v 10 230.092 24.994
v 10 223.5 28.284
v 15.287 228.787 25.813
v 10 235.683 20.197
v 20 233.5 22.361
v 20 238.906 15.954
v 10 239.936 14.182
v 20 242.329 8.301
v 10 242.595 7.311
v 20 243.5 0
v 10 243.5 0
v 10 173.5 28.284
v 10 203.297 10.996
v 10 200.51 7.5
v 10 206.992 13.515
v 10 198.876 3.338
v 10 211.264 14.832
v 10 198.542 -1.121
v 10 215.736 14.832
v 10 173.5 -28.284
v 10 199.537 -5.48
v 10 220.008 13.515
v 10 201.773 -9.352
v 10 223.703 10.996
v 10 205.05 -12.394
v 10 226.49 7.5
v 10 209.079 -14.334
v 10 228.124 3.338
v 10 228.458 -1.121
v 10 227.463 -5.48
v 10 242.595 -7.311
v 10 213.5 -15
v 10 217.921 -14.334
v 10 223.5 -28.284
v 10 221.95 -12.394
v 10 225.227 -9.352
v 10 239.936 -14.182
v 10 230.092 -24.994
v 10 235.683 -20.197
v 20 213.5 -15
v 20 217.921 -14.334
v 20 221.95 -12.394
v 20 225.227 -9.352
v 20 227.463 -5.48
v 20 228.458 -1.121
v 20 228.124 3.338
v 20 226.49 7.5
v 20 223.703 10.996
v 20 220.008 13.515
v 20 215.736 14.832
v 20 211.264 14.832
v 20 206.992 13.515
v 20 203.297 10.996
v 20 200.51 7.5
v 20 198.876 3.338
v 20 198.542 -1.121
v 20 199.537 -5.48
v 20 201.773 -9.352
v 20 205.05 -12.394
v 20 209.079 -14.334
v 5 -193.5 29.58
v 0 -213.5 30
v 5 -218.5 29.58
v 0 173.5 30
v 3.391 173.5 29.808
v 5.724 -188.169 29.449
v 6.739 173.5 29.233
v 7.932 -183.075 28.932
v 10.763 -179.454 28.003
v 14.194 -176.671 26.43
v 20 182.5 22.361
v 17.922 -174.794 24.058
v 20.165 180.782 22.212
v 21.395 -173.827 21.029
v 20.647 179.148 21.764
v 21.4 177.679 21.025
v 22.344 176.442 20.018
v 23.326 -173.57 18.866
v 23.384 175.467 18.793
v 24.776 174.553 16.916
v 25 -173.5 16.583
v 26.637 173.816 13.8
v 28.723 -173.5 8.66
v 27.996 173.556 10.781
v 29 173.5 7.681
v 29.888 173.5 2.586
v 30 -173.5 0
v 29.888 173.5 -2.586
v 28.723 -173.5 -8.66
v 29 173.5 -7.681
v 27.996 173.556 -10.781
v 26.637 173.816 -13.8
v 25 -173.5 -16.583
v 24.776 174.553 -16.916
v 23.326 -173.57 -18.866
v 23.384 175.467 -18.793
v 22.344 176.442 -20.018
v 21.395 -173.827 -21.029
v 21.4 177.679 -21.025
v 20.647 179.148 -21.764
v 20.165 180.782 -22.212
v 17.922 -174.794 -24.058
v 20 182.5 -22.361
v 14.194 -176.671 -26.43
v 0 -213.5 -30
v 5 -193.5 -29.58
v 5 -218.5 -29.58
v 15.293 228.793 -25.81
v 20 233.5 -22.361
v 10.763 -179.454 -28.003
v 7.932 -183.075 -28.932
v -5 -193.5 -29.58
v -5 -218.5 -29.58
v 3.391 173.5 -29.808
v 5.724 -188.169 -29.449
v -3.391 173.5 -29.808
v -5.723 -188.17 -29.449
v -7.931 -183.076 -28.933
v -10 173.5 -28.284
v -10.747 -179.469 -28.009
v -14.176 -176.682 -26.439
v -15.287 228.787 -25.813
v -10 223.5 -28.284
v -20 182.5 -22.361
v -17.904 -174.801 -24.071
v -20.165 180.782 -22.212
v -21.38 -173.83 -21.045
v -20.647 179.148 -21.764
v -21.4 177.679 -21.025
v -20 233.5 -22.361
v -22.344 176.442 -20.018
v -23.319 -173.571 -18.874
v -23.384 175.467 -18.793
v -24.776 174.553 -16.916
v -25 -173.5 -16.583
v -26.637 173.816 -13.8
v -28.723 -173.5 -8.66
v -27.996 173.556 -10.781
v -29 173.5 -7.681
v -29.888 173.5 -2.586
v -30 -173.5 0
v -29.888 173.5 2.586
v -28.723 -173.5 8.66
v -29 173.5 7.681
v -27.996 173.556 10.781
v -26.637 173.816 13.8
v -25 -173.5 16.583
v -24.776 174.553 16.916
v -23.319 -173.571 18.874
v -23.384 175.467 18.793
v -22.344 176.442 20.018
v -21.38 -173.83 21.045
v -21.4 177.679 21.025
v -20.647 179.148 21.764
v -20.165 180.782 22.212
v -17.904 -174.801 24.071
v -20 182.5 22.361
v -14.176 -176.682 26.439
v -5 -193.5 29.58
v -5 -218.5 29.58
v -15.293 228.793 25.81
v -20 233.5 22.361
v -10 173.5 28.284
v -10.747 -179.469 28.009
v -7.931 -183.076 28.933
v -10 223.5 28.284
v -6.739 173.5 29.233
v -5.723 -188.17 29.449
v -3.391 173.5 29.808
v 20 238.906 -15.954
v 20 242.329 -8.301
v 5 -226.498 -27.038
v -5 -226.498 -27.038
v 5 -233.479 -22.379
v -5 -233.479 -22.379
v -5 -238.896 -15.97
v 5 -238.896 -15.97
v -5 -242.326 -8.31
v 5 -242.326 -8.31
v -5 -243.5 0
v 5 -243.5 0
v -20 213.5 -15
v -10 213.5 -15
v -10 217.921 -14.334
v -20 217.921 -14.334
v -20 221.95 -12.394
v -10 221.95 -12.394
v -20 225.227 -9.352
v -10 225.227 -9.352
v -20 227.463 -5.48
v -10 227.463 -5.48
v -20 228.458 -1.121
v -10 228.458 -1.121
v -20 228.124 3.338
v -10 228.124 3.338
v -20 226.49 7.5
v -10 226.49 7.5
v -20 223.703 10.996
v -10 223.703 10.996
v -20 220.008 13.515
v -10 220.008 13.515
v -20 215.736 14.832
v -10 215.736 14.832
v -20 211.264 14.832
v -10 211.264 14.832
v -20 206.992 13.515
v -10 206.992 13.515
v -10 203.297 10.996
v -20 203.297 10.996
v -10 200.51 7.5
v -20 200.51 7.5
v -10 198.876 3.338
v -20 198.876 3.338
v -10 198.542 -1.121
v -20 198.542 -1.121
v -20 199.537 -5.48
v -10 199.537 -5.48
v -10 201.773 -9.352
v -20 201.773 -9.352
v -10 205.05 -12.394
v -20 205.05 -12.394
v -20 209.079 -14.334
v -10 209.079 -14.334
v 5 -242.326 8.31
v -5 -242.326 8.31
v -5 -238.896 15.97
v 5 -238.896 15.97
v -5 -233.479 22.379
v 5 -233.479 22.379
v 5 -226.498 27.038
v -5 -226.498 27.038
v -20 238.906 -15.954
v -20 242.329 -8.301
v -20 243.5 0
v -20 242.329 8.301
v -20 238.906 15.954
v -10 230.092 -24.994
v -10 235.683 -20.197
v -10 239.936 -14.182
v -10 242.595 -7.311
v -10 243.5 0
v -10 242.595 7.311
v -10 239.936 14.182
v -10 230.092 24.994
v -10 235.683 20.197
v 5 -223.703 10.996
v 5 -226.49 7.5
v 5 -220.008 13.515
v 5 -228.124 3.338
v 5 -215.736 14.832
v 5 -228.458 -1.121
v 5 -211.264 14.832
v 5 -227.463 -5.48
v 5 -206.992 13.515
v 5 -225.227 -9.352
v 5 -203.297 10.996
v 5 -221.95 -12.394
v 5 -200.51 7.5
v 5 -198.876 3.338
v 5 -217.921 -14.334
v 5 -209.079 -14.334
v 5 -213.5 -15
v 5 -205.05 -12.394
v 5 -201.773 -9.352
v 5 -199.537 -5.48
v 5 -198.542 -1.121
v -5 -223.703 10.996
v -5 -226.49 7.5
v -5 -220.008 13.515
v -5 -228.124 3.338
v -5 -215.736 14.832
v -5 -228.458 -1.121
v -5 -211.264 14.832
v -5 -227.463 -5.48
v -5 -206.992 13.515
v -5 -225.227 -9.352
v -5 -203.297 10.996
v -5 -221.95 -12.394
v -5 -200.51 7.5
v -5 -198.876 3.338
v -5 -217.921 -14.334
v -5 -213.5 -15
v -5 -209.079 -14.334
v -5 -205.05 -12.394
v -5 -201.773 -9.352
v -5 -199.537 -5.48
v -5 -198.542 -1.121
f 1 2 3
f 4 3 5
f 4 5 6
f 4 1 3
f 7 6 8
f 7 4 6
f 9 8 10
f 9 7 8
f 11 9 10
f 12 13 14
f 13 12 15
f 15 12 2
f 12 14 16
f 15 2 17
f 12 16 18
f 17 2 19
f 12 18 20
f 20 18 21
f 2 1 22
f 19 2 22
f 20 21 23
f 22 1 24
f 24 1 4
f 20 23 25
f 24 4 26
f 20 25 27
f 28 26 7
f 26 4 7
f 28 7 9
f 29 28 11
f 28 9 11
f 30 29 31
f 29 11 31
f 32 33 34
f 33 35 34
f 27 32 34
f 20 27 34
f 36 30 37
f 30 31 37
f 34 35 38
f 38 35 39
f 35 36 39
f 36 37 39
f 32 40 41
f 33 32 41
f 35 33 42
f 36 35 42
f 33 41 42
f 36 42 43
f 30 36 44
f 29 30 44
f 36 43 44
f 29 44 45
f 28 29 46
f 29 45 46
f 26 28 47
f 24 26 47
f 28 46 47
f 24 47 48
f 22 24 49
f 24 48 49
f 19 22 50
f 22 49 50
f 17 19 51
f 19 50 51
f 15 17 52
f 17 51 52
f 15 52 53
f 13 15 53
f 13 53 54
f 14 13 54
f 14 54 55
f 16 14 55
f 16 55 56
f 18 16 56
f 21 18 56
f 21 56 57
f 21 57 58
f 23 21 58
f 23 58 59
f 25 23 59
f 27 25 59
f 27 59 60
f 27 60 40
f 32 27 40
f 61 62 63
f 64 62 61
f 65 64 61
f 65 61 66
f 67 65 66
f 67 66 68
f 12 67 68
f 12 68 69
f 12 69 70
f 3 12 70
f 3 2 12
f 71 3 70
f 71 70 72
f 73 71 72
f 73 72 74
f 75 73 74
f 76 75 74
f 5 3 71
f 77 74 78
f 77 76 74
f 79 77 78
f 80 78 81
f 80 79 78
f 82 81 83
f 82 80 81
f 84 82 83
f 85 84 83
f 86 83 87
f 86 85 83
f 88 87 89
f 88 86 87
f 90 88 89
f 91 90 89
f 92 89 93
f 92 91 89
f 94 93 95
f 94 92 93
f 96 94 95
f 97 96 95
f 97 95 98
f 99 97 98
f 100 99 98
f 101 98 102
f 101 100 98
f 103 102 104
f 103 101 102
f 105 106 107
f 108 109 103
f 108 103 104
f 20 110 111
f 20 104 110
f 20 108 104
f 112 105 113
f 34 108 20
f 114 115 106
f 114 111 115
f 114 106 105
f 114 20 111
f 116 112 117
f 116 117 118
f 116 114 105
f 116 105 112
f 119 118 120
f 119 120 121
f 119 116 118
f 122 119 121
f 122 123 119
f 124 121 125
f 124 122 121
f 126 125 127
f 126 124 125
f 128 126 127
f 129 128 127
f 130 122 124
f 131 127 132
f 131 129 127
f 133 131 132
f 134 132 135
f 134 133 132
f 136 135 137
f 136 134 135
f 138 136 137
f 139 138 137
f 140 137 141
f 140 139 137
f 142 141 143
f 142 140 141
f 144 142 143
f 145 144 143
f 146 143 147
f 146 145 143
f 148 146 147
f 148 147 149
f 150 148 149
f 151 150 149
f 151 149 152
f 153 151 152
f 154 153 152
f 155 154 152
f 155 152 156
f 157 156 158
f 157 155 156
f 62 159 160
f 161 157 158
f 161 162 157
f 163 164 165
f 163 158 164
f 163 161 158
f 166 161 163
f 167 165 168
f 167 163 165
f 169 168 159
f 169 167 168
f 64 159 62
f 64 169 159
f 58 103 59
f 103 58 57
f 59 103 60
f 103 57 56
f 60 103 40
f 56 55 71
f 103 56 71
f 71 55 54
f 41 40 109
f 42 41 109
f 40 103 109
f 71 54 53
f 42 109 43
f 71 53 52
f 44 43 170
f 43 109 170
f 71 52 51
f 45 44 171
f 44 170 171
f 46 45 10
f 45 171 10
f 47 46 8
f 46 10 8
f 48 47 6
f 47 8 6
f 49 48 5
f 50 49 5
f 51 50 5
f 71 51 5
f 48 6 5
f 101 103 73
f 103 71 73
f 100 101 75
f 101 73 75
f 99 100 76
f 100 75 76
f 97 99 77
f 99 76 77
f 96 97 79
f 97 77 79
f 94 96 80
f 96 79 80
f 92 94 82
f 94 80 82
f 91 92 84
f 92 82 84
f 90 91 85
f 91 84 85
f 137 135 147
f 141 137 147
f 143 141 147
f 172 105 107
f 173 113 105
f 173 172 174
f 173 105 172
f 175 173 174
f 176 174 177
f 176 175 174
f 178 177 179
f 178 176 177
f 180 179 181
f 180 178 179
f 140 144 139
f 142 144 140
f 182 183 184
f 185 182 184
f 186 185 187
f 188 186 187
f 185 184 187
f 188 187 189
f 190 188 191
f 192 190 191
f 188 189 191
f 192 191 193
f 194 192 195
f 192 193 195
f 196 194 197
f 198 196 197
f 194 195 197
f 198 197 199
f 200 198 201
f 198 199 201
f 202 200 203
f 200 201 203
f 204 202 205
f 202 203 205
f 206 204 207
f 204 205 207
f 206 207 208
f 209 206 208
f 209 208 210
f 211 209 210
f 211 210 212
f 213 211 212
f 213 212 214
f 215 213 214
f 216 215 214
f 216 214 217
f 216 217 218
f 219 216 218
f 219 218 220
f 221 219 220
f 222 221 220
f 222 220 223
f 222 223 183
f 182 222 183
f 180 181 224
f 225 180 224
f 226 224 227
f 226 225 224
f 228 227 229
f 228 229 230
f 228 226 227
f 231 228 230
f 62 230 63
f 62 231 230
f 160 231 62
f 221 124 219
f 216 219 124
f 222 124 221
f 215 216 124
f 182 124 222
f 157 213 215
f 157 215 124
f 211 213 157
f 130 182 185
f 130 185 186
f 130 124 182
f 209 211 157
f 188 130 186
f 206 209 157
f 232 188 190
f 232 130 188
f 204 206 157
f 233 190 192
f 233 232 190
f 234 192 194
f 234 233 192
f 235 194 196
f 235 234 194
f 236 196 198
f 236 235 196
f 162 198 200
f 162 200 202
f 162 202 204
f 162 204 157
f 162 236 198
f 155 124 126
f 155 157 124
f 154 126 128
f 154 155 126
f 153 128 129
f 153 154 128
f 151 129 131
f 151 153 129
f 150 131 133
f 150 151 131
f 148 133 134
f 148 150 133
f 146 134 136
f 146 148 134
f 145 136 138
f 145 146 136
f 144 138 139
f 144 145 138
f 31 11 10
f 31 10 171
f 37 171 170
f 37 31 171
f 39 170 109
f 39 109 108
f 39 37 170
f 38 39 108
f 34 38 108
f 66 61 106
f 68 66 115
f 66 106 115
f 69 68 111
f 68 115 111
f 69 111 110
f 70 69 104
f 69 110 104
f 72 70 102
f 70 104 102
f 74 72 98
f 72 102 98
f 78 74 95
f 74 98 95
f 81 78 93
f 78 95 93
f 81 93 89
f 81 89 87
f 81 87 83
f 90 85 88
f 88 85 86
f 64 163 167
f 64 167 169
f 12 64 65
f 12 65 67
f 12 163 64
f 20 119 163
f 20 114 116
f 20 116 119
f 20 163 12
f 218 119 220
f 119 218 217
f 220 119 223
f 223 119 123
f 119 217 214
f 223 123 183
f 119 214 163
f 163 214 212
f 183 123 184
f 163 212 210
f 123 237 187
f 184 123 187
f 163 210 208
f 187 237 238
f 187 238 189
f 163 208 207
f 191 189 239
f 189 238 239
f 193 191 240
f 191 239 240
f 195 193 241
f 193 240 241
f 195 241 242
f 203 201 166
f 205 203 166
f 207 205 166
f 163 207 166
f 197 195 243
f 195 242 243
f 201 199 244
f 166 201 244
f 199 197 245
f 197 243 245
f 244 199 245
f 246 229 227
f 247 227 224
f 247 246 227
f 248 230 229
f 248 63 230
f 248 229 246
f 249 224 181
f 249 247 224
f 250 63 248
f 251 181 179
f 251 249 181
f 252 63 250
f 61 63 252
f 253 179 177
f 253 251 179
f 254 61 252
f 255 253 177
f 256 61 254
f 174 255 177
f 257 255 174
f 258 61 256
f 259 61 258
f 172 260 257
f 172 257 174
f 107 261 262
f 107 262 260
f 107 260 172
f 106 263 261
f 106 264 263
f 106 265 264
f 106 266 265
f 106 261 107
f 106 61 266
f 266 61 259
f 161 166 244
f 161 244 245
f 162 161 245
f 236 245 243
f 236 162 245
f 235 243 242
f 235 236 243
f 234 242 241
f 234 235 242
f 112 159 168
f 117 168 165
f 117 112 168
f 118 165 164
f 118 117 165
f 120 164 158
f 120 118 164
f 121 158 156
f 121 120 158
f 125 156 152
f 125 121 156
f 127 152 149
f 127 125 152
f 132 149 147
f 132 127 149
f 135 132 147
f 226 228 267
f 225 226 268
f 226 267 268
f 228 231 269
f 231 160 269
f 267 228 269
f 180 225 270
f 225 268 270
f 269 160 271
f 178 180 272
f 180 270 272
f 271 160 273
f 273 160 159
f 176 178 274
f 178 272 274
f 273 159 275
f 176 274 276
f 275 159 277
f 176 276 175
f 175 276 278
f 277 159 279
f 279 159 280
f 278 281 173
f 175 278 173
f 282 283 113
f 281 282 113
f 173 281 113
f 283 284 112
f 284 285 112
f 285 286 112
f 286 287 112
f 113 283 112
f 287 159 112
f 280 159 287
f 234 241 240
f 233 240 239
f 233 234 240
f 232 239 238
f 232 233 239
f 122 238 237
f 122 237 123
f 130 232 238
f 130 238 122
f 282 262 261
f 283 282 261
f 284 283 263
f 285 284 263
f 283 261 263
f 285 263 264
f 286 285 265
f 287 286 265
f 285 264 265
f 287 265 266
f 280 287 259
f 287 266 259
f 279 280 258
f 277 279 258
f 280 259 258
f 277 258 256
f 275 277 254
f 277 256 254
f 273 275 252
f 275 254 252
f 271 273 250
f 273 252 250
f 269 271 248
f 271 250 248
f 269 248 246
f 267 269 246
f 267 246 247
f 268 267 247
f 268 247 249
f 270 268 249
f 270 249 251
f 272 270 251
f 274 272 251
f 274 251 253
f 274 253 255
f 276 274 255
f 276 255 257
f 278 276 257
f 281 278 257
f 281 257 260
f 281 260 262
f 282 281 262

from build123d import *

# Parameters (mm, degrees)
SKETCH1_R               = 30
BOSS_EXTRUDE1_DEPTH     = 243.5
CUT_EXTRUDE1_DEPTH      = 70
FILLET1_R               = 9
FILLET2_R               = 9
SKETCH4_R               = 15
CUT_EXTRUDE2_DEPTH      = 70
CUT_EXTRUDE3_DEPTH      = 70
CUT_EXTRUDE3_DEPTH_BACK = 70
CUT_EXTRUDE4_START      = -70
CUT_EXTRUDE4_DEPTH      = 70
SKETCH8_R               = 15
CUT_EXTRUDE5_DEPTH      = 60
CUT_EXTRUDE8_DEPTH      = 60
CUT_EXTRUDE8_DEPTH_BACK = 60
FILLET3_R               = 20
FILLET4_R               = 20


with BuildPart() as part:
    # Sketch1 → Boss-Extrude1 (new, symmetric)
    with BuildSketch(Plane(origin=(0, 0, 0), x_dir=(1, 0, 0), z_dir=(0, 1, 0))):
        with Locations(Location((0, 0, 0), (0, 0, 270))):
            Circle(SKETCH1_R)
    extrude(amount=BOSS_EXTRUDE1_DEPTH, both=True)

    # Sketch3 → Cut-Extrude1 (cut)
    with BuildSketch(Plane(origin=(0, 243.5, 0), x_dir=(1, 0, 0), z_dir=(0, 1, 0))):
        with BuildLine():
            Line((-10, 28.284271247), (-10, -28.284271247))
            ThreePointArc((-10, -28.284271247), (0, -30), (10, -28.284271247))
            Line((10, -28.284271247), (10, 28.284271247))
            ThreePointArc((10, 28.284271247), (0, 30), (-10, 28.284271247))
        make_face()
        with BuildLine():
            Line((-20, 22.360679775), (-20, -22.360679775))
            ThreePointArc((-20, -22.360679775), (-30, 0), (-20, 22.360679775))
        make_face()
        with BuildLine():
            Line((20, 22.360679775), (20, -22.360679775))
            ThreePointArc((20, -22.360679775), (30, 0), (20, 22.360679775))
        make_face()
    extrude(amount=-CUT_EXTRUDE1_DEPTH, mode=Mode.SUBTRACT)

    # Fillet1
    fillet1_edges = [part.edges().sort_by_distance(p)[0] for p in [
        (-20, 173.5, 0),
    ]]
    fillet(fillet1_edges, radius=FILLET1_R)

    # Fillet2
    fillet2_edges = [part.edges().sort_by_distance(p)[0] for p in [
        (20, 173.5, 0),
    ]]
    fillet(fillet2_edges, radius=FILLET2_R)

    # Sketch4 → Cut-Extrude2 (cut)
    with BuildSketch(Plane(origin=(20, 0, 0), x_dir=(0, 0, -1), z_dir=(1, 0, 0))):
        with Locations((0, 213.5)):
            Circle(SKETCH4_R)
    extrude(amount=-CUT_EXTRUDE2_DEPTH, mode=Mode.SUBTRACT)

    # Sketch6 → Cut-Extrude3 (cut, two sides: drawn at the far end of the back side and taken through both)
    with BuildSketch(Plane(origin=(0, 0, 0), x_dir=(0, 0, -1), z_dir=(1, 0, 0)).offset(-CUT_EXTRUDE3_DEPTH_BACK)):
        with BuildLine():
            Line((-1.96e-07, 243.5), (-28.284271247, 243.5))
            Line((-28.284271247, 243.5), (-28.284271247, 223.5))
            ThreePointArc((-28.284271247, 223.5), (-17.320508156, 237.994897371), (-1.96e-07, 243.5))
        make_face()
        with BuildLine():
            Line((28.284271247, 243.5), (-1.96e-07, 243.5))
            ThreePointArc((-1.96e-07, 243.5), (17.320507996, 237.994897484), (28.284271247, 223.5))
            Line((28.284271247, 223.5), (28.284271247, 243.5))
        make_face()
    extrude(amount=CUT_EXTRUDE3_DEPTH + CUT_EXTRUDE3_DEPTH_BACK, mode=Mode.SUBTRACT)

    # Sketch7 → Cut-Extrude4 (cut)
    with BuildSketch(Plane.XZ.offset(243.5).offset(CUT_EXTRUDE4_START)):
        with BuildLine():
            Line((-5, 29.580398915), (-5, -29.580398915))
            ThreePointArc((-5, -29.580398915), (-30, 0), (-5, 29.580398915))
        make_face()
        with BuildLine():
            Line((5, 29.580398915), (5, -29.580398915))
            ThreePointArc((5, -29.580398915), (30, 0), (5, 29.580398915))
        make_face()
    extrude(amount=CUT_EXTRUDE4_DEPTH, mode=Mode.SUBTRACT)

    # Sketch8 → Cut-Extrude5 (cut)
    with BuildSketch(Plane(origin=(5, 0, 0), x_dir=(0, 0, -1), z_dir=(1, 0, 0))):
        with Locations((0, -213.5)):
            Circle(SKETCH8_R)
    extrude(amount=-CUT_EXTRUDE5_DEPTH, mode=Mode.SUBTRACT)

    # Sketch10 → Cut-Extrude8 (cut, two sides: drawn at the far end of the back side and taken through both)
    with BuildSketch(Plane(origin=(0, 0, 0), x_dir=(0, 0, -1), z_dir=(1, 0, 0)).offset(-CUT_EXTRUDE8_DEPTH_BACK)):
        with BuildLine():
            Line((30, -243.5), (30, -213.5))
            ThreePointArc((30, -213.5), (21.213203436, -234.713203436), (0, -243.5))
            Line((0, -243.5), (30, -243.5))
        make_face()
        with BuildLine():
            ThreePointArc((0, -243.5), (-21.213203436, -234.713203436), (-30, -213.5))
            Line((-30, -213.5), (-30, -243.5))
            Line((-30, -243.5), (0, -243.5))
        make_face()
    extrude(amount=CUT_EXTRUDE8_DEPTH + CUT_EXTRUDE8_DEPTH_BACK, mode=Mode.SUBTRACT)

    # Fillet3
    fillet3_edges = [part.edges().sort_by_distance(p)[0] for p in [
        (5, -173.5, 0),
    ]]
    fillet(fillet3_edges, radius=FILLET3_R)

    # Fillet4
    fillet4_edges = [part.edges().sort_by_distance(p)[0] for p in [
        (-5, -173.5, 0),
    ]]
    fillet(fillet4_edges, radius=FILLET4_R)


solid = part.part
